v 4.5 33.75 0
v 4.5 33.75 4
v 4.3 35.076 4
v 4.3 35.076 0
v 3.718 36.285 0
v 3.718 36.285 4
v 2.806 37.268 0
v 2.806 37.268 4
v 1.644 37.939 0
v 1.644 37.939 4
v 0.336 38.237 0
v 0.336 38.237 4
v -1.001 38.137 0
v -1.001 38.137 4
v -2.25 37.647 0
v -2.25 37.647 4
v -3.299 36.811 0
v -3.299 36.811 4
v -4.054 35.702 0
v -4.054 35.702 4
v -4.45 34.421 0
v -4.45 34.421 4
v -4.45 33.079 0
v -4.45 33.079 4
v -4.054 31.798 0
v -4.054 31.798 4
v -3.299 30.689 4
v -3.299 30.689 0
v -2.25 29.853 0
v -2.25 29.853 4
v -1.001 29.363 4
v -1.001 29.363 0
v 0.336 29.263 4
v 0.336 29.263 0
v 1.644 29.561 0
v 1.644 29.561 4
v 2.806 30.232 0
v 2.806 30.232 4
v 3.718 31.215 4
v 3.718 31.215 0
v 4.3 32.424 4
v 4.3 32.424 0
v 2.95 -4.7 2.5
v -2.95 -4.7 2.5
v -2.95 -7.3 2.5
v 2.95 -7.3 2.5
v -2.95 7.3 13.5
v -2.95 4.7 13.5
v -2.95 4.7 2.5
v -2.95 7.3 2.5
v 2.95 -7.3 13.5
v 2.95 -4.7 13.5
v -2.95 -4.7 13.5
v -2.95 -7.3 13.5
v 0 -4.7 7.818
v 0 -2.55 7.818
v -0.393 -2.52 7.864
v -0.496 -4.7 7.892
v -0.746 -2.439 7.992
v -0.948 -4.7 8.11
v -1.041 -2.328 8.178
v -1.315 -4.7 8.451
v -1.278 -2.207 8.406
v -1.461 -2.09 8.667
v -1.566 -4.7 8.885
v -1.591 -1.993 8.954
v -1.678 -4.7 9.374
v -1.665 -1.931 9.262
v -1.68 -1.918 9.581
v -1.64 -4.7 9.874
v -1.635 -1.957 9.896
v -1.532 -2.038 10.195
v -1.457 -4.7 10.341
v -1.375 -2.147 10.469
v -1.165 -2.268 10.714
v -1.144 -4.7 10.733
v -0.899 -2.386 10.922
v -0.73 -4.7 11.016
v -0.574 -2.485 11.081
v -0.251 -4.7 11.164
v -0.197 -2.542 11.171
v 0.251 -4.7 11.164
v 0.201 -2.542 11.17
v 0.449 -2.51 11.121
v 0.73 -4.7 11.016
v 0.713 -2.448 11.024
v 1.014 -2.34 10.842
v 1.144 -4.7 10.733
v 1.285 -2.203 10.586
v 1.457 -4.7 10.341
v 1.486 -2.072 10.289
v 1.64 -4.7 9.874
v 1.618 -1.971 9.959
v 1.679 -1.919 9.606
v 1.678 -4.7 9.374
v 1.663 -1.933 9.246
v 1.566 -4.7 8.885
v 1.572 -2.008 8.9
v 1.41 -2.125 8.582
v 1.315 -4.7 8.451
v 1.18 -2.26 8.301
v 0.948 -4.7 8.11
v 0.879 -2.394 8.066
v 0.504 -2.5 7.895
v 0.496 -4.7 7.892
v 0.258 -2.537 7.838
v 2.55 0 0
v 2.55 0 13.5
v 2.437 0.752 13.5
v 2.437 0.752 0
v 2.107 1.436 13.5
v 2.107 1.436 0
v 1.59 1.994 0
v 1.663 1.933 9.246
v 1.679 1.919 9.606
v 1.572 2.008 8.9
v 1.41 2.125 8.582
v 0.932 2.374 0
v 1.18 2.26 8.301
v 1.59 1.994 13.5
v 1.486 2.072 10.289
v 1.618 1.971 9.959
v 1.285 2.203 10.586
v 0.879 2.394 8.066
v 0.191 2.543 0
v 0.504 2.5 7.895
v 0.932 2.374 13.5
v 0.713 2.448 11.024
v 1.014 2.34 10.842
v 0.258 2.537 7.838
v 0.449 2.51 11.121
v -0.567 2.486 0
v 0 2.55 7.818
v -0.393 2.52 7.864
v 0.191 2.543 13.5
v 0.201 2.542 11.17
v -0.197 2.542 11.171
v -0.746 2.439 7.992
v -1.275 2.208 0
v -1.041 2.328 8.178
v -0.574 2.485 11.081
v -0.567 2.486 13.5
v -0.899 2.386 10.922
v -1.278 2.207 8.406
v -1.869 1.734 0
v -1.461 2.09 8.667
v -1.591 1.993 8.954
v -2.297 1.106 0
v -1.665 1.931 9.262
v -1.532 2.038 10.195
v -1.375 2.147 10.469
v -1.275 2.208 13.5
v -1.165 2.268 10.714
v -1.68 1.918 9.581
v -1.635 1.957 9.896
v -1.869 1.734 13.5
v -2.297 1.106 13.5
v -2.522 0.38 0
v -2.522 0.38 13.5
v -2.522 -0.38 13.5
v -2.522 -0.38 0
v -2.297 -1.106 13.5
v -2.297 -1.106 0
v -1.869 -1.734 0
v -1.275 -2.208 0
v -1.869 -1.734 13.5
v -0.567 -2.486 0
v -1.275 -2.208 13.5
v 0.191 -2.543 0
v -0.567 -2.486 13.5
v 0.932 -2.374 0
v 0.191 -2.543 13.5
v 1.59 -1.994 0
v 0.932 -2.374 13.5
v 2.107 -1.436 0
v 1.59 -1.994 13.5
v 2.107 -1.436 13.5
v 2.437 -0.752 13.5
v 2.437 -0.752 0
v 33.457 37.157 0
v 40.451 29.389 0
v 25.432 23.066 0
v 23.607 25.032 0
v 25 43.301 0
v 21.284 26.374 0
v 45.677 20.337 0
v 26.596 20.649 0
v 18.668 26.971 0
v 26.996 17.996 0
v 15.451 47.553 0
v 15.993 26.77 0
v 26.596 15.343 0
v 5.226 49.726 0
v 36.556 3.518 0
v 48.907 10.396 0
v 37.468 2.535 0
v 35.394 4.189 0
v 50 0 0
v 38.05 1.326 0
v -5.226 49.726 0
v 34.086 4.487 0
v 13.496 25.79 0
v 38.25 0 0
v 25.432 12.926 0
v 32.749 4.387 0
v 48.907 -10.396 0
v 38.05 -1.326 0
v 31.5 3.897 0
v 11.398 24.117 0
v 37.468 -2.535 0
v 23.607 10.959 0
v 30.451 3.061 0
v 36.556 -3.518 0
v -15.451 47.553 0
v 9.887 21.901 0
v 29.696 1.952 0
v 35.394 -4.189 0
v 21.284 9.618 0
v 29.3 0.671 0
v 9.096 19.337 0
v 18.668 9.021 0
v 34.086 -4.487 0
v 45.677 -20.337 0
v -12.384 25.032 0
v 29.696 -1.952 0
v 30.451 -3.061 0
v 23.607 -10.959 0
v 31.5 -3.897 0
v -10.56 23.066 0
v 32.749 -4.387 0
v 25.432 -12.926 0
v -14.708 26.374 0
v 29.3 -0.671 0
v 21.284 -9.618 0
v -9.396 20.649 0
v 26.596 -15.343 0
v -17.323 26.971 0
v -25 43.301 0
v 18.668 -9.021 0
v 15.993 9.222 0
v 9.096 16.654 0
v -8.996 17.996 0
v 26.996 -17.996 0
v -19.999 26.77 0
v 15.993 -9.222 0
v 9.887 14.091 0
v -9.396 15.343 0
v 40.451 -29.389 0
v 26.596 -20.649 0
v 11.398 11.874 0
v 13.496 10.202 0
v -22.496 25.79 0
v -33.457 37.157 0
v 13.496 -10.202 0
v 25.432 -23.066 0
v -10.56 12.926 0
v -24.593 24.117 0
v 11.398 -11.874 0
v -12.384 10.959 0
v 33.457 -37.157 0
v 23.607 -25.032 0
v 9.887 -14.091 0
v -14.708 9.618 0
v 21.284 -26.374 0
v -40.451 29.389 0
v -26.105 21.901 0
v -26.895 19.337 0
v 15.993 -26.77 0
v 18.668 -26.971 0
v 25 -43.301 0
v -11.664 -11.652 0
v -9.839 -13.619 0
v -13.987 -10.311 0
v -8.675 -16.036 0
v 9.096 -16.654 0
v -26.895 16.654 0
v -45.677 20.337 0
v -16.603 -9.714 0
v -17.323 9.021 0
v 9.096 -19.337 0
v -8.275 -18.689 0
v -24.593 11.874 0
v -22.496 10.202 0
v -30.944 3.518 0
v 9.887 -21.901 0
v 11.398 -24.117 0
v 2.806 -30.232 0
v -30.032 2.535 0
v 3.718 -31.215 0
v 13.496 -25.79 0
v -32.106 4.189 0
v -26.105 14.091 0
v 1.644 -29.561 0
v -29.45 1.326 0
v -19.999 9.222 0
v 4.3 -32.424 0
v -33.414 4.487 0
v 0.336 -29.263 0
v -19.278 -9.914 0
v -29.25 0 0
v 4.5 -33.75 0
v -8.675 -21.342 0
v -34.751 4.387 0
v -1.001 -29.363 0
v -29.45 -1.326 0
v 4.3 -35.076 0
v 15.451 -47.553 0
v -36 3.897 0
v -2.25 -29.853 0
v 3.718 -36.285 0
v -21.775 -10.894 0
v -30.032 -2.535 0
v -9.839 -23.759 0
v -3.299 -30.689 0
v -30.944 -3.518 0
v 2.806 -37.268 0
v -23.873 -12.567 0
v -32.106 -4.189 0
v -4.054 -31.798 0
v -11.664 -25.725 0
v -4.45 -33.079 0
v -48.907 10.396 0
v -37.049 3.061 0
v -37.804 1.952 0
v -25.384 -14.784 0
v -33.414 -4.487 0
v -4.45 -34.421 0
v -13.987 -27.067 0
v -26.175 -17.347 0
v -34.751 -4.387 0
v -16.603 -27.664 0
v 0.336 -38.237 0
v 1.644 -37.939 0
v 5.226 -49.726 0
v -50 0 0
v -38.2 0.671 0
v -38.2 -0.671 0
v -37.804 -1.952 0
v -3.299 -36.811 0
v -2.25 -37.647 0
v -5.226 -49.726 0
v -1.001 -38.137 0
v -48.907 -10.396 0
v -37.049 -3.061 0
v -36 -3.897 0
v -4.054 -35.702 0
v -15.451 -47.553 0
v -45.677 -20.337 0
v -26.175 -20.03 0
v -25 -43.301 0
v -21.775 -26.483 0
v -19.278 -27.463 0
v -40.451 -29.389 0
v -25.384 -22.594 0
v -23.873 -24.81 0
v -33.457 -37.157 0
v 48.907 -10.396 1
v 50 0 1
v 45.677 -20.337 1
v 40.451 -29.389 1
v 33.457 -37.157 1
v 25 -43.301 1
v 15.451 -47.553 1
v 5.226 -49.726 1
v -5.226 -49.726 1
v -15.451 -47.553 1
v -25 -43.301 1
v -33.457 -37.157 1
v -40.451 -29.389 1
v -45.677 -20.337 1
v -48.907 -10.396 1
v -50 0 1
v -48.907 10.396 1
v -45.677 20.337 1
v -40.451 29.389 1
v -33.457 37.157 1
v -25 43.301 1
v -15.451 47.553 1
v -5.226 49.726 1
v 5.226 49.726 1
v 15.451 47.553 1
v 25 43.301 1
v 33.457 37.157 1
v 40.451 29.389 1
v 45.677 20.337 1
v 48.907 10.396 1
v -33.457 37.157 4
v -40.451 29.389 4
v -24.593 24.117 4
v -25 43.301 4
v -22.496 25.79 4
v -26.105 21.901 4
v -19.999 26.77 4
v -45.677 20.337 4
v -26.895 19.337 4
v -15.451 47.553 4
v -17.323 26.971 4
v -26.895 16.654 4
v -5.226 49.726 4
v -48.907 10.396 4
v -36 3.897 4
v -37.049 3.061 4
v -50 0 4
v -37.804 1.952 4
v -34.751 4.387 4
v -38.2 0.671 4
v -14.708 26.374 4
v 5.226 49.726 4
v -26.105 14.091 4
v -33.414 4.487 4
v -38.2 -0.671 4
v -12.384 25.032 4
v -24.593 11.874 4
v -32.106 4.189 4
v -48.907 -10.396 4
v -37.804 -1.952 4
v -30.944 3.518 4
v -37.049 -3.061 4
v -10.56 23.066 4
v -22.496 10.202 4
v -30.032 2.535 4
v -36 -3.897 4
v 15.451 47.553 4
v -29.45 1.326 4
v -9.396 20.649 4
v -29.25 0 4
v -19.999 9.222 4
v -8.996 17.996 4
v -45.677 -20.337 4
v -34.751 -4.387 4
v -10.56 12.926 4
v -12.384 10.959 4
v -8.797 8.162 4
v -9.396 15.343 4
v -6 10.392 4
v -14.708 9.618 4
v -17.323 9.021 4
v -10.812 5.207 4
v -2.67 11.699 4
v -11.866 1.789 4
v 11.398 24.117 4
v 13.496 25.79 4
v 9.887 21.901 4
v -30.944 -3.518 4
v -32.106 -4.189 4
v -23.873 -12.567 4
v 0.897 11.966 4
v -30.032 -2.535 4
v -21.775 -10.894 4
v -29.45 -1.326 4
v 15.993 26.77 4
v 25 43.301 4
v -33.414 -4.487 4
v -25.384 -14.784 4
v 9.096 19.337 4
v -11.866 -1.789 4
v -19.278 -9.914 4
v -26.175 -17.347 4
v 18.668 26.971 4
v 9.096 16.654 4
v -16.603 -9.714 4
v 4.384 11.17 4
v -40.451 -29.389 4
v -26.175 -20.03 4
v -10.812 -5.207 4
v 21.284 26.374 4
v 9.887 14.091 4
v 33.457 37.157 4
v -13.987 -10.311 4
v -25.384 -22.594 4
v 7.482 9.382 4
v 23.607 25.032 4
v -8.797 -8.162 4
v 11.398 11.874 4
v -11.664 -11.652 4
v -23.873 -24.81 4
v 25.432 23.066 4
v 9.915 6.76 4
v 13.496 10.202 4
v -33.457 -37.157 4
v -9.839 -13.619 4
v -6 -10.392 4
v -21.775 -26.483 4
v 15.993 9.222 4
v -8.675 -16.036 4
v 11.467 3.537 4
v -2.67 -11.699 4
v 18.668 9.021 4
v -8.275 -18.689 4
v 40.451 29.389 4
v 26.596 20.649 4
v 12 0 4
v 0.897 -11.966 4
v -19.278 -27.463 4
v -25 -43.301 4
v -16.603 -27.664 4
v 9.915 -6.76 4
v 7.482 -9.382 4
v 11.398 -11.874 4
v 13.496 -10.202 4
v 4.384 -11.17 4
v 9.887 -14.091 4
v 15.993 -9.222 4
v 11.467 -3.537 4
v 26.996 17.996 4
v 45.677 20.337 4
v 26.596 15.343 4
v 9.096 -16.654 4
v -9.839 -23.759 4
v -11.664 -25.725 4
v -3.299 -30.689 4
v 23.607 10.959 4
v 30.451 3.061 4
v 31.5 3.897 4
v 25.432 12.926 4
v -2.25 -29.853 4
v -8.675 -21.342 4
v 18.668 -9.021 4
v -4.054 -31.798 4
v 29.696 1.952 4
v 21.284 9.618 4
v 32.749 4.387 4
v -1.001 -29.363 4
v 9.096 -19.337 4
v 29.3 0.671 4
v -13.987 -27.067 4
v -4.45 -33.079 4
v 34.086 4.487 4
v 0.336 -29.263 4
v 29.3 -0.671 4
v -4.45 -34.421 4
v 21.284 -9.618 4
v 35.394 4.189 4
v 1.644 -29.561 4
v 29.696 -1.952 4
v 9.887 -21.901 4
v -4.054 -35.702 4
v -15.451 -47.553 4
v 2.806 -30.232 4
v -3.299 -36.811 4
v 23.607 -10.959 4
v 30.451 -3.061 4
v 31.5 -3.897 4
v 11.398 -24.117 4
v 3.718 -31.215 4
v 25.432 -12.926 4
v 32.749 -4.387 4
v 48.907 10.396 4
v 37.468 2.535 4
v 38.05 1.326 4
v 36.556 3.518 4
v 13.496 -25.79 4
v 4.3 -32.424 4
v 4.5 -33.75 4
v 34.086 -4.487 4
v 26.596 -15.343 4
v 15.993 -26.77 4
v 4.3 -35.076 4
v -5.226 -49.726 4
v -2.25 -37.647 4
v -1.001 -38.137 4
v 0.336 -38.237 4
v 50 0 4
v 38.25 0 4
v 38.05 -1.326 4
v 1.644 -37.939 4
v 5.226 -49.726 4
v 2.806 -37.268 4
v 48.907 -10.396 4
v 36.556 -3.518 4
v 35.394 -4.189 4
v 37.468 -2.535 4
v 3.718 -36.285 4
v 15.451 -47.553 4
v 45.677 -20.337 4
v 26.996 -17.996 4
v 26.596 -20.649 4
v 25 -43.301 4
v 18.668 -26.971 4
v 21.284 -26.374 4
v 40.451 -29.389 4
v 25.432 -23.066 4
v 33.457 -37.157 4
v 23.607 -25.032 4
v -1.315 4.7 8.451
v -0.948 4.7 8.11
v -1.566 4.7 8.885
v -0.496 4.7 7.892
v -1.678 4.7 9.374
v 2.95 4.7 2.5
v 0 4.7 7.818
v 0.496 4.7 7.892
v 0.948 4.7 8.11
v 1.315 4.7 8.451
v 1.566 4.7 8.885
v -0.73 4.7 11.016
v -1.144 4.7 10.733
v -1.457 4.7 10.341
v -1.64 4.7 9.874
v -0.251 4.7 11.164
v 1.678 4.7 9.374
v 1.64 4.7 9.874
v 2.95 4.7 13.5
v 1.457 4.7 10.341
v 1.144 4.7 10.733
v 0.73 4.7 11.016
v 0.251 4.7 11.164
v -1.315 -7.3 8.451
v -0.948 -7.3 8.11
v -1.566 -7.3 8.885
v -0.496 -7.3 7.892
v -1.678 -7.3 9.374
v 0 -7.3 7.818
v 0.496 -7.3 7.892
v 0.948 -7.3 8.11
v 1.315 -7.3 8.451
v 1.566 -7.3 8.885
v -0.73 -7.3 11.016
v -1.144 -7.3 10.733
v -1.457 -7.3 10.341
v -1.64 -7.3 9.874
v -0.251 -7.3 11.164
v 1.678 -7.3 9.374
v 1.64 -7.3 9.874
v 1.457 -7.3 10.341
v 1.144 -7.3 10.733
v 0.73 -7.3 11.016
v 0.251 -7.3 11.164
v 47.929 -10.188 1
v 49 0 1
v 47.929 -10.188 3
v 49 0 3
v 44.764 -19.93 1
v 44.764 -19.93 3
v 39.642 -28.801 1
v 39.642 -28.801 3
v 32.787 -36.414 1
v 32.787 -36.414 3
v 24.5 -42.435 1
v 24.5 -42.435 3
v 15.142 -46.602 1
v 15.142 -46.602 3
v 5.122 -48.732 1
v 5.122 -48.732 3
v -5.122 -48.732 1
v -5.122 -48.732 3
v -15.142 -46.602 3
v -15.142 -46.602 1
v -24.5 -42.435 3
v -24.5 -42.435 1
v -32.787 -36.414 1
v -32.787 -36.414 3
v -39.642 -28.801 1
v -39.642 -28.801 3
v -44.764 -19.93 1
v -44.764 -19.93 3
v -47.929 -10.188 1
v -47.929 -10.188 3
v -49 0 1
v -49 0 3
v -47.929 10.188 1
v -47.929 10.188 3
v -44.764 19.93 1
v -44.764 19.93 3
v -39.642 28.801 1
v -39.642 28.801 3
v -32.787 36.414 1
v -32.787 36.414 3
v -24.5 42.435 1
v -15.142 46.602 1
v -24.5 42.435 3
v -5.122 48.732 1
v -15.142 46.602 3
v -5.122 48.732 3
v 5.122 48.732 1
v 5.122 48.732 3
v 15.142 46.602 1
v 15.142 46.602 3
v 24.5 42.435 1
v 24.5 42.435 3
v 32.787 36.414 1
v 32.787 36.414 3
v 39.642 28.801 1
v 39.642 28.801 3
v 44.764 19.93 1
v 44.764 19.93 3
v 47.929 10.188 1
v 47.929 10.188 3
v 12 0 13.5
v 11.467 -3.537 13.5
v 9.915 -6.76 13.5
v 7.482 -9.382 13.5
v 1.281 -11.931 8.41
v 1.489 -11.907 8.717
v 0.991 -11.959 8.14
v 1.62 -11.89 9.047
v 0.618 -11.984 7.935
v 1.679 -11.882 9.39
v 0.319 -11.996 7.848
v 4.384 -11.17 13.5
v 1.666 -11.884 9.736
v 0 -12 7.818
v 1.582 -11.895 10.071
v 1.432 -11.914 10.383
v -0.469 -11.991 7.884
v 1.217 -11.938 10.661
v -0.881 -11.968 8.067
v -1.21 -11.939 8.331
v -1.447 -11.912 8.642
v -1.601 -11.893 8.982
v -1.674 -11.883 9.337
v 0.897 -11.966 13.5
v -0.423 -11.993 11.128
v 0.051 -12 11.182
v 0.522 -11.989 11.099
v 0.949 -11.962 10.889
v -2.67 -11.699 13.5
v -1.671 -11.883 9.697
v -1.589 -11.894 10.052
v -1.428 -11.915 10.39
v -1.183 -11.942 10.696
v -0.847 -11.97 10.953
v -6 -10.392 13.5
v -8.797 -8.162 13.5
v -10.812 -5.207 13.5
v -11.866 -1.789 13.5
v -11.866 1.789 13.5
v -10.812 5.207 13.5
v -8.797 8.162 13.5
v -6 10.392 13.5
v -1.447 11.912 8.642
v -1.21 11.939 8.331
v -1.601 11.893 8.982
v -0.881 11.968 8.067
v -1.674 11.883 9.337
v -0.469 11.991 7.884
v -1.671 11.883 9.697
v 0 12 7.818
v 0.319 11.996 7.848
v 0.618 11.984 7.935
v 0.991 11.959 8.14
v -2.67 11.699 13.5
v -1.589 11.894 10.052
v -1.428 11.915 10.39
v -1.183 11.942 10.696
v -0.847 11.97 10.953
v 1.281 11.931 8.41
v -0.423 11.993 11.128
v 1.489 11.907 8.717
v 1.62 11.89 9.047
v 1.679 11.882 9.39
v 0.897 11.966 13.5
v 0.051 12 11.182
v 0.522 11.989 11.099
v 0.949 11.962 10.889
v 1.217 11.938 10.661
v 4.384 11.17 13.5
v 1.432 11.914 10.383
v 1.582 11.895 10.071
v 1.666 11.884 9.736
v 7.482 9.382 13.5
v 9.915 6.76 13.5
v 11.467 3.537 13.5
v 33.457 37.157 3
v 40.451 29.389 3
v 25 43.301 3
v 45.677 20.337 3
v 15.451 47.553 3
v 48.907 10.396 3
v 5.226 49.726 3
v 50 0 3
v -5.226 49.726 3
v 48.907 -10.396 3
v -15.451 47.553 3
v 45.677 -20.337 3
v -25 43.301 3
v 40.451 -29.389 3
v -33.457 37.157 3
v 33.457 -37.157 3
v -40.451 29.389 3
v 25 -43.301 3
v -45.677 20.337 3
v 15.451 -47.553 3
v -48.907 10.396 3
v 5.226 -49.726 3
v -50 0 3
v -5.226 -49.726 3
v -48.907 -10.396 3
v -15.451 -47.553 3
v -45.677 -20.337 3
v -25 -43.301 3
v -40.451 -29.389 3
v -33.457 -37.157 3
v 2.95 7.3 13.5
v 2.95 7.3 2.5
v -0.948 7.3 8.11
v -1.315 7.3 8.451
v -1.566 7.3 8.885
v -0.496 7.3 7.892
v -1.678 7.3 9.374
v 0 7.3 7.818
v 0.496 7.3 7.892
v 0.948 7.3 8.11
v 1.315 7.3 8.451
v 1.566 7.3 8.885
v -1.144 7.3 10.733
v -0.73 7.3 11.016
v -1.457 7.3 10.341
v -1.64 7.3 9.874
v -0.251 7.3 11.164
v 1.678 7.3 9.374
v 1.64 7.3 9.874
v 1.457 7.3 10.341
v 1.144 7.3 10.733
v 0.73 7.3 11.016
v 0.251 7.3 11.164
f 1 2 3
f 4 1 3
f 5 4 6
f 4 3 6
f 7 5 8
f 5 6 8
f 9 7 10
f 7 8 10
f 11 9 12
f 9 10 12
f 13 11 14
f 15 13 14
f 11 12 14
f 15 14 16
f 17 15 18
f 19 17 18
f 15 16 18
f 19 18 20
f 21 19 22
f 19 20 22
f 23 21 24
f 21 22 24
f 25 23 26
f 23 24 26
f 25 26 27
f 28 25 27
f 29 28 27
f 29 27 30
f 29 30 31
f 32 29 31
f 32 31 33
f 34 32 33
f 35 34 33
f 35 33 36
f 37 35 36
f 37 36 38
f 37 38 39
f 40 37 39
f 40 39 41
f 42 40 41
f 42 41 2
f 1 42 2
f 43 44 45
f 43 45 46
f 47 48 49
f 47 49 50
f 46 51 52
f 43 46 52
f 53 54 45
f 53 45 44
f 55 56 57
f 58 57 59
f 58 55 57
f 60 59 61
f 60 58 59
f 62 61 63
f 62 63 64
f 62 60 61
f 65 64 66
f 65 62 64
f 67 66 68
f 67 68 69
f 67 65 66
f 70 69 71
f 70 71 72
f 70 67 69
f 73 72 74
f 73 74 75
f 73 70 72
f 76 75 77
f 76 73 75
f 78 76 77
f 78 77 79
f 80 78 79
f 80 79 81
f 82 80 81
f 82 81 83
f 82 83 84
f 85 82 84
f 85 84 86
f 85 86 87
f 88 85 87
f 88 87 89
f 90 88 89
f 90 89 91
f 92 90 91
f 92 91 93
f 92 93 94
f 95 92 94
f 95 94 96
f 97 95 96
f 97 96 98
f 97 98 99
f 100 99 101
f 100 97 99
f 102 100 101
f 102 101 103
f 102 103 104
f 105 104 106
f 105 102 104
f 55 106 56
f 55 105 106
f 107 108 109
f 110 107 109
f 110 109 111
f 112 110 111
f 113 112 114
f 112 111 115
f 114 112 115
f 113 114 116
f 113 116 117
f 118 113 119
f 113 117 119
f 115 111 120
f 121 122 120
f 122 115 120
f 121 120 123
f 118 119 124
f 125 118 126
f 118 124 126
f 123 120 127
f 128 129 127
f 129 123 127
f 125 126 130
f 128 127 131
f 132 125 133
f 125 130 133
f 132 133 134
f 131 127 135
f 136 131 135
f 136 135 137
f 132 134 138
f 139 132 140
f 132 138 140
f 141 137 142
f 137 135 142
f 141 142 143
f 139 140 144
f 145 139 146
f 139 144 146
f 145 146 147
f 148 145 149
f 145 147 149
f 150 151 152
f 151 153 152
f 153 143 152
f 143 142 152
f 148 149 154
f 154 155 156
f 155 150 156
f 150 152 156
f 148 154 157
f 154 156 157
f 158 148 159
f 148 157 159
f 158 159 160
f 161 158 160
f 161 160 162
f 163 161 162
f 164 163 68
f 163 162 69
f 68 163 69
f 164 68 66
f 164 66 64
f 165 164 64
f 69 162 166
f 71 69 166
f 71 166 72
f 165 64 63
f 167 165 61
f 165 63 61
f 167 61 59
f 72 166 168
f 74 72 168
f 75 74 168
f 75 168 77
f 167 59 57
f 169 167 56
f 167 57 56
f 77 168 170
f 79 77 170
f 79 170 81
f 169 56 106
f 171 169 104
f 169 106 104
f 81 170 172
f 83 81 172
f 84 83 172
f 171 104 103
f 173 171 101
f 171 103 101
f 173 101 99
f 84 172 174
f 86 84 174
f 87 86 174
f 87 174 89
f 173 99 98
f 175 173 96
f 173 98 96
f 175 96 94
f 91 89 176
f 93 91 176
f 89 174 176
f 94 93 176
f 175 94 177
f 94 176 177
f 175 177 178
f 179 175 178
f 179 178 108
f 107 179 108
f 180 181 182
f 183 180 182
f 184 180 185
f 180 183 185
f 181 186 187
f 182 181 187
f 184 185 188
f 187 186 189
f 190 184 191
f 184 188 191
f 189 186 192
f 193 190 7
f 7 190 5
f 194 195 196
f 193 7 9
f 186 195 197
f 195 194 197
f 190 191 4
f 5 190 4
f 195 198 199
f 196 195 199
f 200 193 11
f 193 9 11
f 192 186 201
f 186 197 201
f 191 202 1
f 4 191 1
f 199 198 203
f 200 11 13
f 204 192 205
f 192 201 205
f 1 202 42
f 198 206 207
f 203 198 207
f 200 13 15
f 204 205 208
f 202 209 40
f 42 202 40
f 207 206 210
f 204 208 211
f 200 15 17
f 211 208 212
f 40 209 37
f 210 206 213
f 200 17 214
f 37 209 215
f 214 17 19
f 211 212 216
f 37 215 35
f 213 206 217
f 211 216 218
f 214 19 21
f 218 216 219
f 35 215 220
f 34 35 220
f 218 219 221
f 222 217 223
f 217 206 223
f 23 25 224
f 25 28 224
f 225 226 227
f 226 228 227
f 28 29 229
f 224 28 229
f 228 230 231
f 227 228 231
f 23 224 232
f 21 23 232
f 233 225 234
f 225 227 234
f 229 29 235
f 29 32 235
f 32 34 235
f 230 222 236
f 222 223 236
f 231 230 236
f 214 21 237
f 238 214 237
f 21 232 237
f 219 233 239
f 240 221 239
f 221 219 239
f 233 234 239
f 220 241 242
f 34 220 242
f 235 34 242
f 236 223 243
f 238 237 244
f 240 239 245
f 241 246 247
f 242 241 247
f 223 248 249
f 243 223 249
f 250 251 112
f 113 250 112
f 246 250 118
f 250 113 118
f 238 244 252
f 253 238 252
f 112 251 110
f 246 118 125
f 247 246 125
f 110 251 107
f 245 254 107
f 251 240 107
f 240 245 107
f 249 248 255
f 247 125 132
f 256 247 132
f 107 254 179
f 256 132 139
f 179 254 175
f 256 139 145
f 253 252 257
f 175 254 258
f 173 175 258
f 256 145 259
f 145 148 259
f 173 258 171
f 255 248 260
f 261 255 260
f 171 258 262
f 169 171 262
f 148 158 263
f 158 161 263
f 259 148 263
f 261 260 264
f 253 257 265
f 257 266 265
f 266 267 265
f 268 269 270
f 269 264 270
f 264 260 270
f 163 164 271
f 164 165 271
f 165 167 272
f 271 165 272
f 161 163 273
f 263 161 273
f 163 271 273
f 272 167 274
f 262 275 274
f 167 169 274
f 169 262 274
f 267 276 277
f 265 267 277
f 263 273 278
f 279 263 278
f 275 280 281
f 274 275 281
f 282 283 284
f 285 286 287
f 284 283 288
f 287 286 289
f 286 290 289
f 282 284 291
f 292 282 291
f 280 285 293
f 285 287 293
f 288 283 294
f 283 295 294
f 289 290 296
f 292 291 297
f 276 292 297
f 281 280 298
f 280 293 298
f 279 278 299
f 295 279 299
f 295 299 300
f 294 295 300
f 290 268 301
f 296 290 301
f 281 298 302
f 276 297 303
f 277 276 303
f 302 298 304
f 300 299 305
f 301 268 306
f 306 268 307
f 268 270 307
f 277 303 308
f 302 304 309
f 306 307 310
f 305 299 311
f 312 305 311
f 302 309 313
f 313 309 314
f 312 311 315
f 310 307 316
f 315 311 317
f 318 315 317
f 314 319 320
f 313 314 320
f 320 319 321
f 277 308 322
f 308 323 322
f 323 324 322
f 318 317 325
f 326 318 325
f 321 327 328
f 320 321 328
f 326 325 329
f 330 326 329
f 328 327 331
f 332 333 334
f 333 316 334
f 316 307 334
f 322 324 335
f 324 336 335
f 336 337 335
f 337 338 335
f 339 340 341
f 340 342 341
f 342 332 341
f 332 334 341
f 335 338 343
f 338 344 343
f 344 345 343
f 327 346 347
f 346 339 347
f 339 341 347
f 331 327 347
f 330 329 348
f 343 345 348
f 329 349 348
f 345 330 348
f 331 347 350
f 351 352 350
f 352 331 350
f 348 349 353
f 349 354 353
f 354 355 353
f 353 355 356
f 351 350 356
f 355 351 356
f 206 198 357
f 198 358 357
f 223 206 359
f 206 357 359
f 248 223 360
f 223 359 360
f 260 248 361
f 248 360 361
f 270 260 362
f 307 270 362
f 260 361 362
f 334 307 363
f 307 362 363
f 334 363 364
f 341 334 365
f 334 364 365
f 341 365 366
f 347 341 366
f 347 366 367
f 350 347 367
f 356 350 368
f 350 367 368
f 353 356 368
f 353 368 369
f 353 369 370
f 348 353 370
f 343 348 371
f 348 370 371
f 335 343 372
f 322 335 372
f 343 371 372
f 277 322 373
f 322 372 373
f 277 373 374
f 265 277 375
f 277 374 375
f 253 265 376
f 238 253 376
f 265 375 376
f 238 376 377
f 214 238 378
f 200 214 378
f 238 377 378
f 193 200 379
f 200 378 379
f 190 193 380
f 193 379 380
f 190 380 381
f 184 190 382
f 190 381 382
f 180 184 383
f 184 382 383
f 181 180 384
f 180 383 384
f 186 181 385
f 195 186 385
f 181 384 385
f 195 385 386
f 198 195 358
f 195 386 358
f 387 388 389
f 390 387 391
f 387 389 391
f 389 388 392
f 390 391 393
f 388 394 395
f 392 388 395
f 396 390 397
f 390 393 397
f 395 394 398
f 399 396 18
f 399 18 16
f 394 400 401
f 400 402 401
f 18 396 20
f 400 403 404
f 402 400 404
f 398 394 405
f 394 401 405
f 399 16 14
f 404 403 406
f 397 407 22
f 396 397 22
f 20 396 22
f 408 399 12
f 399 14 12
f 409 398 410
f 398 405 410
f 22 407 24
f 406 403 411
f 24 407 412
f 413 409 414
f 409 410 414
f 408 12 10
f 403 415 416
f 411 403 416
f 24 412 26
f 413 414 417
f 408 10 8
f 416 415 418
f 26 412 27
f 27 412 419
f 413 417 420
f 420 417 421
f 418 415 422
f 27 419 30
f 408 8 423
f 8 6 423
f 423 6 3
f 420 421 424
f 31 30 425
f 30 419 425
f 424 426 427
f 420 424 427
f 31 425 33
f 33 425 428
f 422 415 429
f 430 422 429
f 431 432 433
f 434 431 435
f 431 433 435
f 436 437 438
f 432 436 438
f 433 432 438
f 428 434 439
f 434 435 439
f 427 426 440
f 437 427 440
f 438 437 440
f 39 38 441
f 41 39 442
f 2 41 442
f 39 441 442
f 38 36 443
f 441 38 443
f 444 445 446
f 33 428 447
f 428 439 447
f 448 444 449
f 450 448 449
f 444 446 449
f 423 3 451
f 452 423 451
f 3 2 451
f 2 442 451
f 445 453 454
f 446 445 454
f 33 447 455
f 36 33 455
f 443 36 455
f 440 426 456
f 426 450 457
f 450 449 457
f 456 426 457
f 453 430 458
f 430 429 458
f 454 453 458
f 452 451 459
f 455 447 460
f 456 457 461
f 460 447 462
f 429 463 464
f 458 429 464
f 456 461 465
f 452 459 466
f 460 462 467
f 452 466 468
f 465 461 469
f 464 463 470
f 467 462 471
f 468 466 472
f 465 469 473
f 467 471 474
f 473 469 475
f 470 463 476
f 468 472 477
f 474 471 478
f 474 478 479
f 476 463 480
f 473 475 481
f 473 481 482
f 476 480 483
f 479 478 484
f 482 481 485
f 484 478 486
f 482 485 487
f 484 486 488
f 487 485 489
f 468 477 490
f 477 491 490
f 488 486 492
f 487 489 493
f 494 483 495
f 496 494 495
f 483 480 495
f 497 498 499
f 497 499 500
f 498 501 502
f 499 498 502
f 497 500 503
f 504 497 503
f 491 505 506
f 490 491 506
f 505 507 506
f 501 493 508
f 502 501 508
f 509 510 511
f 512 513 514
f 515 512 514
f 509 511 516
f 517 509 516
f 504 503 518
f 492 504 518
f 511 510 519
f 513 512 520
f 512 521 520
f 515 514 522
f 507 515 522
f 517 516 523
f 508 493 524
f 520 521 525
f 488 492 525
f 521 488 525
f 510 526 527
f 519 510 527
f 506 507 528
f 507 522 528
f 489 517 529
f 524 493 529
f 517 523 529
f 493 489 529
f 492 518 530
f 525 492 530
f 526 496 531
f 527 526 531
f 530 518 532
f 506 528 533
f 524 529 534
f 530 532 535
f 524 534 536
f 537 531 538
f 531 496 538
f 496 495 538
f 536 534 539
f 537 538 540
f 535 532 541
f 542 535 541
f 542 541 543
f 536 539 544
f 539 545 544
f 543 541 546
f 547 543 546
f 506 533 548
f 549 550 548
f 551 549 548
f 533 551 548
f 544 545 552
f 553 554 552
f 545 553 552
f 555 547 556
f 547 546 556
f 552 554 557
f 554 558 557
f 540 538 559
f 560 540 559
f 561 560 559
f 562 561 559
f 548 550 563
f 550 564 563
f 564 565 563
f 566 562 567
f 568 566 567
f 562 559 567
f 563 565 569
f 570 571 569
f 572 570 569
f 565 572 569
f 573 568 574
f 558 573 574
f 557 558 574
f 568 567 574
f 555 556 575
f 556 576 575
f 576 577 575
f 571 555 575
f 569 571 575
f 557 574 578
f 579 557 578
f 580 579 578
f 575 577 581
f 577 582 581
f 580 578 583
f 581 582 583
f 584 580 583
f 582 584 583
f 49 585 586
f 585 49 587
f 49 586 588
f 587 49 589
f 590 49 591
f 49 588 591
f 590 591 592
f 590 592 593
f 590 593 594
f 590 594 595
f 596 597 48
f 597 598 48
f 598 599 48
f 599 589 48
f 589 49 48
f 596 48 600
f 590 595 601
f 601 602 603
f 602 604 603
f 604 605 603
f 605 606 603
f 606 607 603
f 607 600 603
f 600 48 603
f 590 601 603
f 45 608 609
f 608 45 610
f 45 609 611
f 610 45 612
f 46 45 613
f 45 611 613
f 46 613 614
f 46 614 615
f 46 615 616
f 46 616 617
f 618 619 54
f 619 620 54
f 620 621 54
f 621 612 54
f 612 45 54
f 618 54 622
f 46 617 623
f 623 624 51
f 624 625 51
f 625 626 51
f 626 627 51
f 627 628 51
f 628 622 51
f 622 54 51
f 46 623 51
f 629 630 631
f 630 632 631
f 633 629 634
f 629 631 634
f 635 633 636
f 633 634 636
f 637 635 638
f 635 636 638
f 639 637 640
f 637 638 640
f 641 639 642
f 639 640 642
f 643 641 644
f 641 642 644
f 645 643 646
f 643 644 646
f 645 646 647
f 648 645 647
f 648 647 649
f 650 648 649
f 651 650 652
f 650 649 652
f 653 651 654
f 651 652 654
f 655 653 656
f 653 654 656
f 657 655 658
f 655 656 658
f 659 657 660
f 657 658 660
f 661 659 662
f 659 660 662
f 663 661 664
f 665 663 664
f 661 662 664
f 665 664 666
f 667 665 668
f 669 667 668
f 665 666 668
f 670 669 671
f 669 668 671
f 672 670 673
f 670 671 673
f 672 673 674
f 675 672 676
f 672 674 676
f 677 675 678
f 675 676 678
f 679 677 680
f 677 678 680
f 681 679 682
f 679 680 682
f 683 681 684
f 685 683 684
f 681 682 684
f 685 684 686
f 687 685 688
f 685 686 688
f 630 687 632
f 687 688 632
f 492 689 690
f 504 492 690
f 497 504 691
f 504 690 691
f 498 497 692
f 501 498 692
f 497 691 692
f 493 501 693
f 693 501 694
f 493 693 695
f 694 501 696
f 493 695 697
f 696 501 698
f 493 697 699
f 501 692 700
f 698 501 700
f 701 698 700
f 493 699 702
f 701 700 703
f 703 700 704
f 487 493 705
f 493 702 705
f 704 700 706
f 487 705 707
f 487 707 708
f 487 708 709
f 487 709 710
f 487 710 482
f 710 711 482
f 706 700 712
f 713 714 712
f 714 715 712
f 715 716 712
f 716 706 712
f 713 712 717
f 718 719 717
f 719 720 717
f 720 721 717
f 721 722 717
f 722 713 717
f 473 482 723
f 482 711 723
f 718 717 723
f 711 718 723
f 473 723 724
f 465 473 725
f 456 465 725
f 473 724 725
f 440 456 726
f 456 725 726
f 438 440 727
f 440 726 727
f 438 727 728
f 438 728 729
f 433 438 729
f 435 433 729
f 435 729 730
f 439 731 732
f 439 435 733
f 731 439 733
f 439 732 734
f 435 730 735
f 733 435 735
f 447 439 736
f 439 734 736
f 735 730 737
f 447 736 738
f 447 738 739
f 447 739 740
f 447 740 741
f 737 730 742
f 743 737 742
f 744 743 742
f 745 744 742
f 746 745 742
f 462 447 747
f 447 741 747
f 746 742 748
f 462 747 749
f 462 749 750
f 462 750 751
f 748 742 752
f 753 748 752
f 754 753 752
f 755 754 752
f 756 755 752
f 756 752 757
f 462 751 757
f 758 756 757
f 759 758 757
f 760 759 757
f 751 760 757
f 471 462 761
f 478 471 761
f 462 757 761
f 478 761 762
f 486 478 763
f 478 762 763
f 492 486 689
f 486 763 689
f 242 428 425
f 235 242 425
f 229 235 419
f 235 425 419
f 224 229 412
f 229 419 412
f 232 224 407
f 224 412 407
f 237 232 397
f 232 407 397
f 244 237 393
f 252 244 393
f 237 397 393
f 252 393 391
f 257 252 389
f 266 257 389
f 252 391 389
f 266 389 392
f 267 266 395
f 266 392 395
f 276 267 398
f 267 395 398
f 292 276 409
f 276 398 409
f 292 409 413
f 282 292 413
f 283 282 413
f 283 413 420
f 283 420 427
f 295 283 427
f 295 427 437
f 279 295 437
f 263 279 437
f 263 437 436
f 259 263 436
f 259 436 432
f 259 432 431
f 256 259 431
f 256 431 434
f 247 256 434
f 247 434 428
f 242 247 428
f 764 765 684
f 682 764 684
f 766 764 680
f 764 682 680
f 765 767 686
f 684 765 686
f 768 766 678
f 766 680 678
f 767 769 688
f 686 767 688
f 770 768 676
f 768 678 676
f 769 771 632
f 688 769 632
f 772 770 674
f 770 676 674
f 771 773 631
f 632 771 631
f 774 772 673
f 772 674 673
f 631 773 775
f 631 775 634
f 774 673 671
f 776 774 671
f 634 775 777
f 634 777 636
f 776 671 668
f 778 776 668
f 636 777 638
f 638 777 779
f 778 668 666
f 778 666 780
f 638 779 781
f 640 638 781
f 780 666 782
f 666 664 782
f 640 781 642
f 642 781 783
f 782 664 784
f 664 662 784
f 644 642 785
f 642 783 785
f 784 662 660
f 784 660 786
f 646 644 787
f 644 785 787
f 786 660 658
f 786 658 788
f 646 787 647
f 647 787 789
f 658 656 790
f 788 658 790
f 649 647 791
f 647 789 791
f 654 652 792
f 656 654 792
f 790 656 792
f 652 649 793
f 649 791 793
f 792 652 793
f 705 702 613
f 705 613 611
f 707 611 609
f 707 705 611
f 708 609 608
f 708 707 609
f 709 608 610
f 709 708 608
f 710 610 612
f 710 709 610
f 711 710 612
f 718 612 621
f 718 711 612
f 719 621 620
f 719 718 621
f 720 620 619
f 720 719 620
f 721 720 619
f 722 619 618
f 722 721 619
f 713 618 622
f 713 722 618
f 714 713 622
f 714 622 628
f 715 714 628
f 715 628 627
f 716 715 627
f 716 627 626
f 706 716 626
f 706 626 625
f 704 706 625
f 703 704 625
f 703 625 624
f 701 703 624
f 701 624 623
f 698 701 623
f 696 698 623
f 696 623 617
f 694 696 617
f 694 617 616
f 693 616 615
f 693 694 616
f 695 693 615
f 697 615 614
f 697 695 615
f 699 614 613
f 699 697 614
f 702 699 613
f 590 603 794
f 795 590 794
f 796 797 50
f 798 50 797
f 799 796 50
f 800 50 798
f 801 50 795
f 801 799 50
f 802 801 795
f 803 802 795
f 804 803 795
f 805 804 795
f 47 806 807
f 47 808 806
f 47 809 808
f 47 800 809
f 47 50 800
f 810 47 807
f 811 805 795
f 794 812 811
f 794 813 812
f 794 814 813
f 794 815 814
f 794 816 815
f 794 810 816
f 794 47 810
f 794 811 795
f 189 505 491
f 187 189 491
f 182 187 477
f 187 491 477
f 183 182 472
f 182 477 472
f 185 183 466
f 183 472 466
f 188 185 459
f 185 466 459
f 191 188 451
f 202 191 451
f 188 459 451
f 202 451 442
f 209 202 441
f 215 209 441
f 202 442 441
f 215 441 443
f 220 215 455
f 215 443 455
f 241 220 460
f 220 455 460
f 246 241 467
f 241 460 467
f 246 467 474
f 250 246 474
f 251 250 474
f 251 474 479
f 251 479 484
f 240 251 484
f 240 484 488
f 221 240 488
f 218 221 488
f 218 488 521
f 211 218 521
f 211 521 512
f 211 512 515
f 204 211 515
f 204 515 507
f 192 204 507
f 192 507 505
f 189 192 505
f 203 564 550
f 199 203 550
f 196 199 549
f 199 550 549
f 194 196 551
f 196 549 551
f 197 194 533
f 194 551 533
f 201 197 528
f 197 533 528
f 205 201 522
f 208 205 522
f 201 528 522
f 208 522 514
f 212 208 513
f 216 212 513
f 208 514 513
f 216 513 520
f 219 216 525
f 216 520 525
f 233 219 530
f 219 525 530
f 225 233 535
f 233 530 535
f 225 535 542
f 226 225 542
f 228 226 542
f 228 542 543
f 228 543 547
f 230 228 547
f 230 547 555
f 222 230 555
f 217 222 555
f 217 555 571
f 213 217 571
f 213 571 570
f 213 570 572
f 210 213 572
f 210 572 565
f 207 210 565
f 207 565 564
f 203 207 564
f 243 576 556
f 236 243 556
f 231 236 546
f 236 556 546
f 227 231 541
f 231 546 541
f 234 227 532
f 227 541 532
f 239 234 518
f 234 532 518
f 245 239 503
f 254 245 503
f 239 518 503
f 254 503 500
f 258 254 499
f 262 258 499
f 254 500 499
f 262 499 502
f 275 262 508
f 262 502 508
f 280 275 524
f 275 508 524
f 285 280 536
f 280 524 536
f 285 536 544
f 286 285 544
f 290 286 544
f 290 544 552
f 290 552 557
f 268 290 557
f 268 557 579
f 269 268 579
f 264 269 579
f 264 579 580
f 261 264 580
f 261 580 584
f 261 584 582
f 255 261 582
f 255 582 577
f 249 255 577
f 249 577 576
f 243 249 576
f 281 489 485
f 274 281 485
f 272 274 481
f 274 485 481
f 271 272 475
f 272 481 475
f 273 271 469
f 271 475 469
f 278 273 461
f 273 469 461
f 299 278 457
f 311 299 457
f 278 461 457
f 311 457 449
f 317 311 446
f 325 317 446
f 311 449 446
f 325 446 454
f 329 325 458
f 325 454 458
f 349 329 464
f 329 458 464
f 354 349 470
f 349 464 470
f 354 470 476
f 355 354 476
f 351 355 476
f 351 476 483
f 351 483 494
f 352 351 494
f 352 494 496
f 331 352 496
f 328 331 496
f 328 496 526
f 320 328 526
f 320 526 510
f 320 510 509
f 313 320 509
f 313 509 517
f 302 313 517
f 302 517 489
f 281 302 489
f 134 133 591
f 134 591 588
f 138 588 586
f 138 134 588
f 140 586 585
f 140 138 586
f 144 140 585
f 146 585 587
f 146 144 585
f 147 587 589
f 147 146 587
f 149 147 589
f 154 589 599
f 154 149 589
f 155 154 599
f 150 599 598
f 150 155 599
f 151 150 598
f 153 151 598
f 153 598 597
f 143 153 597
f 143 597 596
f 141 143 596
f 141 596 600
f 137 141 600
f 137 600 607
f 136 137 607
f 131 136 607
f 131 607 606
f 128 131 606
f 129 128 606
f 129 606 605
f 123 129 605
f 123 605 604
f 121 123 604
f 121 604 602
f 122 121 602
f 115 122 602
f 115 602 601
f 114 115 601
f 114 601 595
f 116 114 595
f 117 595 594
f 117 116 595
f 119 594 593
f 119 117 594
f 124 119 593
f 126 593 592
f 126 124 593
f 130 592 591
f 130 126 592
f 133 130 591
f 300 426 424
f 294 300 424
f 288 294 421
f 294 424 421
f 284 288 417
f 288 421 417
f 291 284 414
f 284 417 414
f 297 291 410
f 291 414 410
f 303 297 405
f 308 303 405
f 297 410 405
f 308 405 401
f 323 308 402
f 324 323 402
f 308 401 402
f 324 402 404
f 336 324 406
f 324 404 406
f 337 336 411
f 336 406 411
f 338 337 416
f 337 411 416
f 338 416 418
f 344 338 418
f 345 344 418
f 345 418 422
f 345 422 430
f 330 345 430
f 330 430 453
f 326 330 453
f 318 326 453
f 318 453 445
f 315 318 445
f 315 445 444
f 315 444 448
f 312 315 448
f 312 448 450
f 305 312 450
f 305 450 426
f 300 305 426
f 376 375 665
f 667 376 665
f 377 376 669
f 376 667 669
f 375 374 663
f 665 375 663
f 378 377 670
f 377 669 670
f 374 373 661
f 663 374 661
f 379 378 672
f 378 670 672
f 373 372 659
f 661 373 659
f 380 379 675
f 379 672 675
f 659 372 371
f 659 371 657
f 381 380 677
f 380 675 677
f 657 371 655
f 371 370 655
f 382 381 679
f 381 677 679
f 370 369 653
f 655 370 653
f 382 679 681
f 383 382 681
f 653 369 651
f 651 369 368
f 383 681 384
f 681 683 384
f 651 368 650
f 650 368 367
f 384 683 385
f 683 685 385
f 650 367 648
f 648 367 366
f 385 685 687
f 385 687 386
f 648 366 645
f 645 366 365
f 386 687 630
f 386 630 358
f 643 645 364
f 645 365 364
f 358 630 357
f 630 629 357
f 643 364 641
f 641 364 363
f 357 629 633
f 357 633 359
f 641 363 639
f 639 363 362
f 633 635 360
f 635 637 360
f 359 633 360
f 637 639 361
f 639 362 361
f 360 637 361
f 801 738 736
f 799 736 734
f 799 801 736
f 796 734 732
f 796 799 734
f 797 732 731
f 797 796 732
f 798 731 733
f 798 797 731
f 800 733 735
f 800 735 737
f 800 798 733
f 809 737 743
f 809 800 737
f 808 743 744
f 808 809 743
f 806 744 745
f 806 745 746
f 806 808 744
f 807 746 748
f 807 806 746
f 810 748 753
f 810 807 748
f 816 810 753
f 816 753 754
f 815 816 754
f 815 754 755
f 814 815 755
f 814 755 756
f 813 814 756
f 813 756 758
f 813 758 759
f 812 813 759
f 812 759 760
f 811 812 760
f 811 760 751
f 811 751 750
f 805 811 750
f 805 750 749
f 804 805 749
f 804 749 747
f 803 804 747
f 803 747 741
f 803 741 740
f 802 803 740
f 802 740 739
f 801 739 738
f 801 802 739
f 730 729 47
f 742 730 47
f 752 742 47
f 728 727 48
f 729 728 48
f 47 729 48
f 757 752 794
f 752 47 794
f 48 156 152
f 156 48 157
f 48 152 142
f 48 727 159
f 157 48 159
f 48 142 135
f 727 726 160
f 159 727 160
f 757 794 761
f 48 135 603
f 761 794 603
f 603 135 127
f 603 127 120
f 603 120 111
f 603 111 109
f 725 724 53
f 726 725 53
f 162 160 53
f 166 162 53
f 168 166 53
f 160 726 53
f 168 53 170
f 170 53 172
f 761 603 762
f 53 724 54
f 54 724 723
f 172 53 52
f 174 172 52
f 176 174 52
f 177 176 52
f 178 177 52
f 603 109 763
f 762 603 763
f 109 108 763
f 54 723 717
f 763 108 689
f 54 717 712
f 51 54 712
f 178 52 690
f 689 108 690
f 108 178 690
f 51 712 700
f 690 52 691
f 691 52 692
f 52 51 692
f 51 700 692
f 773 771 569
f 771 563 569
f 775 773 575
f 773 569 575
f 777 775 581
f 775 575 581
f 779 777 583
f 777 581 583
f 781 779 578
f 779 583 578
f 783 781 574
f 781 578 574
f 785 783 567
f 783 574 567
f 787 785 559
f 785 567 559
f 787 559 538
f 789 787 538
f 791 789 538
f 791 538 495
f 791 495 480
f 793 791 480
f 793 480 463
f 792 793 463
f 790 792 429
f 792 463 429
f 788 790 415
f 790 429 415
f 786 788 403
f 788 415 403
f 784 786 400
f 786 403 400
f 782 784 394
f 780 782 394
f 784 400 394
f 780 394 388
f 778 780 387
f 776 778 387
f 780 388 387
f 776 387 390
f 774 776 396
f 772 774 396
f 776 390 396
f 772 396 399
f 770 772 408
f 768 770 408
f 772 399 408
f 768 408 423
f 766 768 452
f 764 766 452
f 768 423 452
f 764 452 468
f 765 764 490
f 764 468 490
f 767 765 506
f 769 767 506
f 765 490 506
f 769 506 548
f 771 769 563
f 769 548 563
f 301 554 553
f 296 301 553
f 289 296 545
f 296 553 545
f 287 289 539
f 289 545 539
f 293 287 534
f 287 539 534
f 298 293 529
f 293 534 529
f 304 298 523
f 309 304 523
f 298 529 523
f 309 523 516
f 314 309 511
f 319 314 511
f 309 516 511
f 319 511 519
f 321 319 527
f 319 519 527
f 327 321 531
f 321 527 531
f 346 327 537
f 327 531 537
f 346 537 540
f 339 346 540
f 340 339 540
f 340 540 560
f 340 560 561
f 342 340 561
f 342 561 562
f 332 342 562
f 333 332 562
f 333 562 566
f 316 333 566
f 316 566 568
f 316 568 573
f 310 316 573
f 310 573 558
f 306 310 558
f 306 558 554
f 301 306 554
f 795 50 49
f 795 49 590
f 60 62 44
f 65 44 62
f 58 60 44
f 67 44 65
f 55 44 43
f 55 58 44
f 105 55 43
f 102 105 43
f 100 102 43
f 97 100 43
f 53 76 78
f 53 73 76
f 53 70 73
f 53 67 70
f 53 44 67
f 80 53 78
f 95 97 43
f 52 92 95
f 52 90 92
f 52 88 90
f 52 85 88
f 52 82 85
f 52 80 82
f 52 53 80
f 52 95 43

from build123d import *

# Parameters (mm, degrees)
SKETCH2_R               = 2.55
CUT_EXTRUDE1_DEPTH      = 36
SKETCH3_W               = 5.9
SKETCH3_H               = 2.6
CUT_EXTRUDE2_DEPTH      = 11
SKETCH4_R               = 4.5
SKETCH4_R_2             = 9
CUT_EXTRUDE3_DEPTH      = 11
CUT_EXTRUDE4_DEPTH      = 61
CUT_EXTRUDE4_DEPTH_BACK = 81
SKETCH5_R               = 1.682339559


with BuildPart() as part:
    # Sketch1 → Revolve2 (revolve)
    with BuildSketch(Plane(origin=(0, 0, 0), x_dir=(0, 0, -1), z_dir=(1, 0, 0)), mode=Mode.PRIVATE) as revolve2_sk:
        Polygon((0, 0), (0, 50), (-1, 50), (-1, 49), (-3, 49), (-3, 50), (-4, 50), (-4, 12), (-13.5, 12), (-13.5, 0), align=None)
    revolve(revolve2_sk.sketch.rotate(Axis((0, 0, 13.5), (0, 0, -1)), 90), axis=Axis((0, 0, 13.5), (0, 0, -1)))

    # Sketch2 → Cut-Extrude1 (cut)
    with BuildSketch(Plane.XY.offset(13.5)):
        Circle(SKETCH2_R)
    extrude(amount=-CUT_EXTRUDE1_DEPTH, mode=Mode.SUBTRACT)

    # Sketch3 → Cut-Extrude2 (cut)
    with BuildSketch(Plane.XY.offset(13.5)):
        with Locations((0, 6)):
            Rectangle(SKETCH3_W, SKETCH3_H)
        with Locations((0, -6)):
            Rectangle(SKETCH3_W, SKETCH3_H)
    extrude(amount=-CUT_EXTRUDE2_DEPTH, mode=Mode.SUBTRACT)

    # Sketch4 → Cut-Extrude3 (cut)
    with BuildSketch(Plane.XY.offset(4)):
        with Locations((0, 33.75)):
            Circle(SKETCH4_R)
        with Locations((0, -33.75)):
            Circle(SKETCH4_R)
        with Locations((33.75, 0)):
            Circle(SKETCH4_R)
        with Locations((-33.75, 0)):
            Circle(SKETCH4_R)
        with Locations((-17.995867581, 17.995867581)):
            Circle(SKETCH4_R_2)
        with Locations((17.995867581, 17.995867581)):
            Circle(SKETCH4_R_2)
        with Locations((17.995867581, -17.995867581)):
            Circle(SKETCH4_R_2)
        with Locations((-17.27525282, -18.688716917)):
            Circle(SKETCH4_R_2)
    extrude(amount=-CUT_EXTRUDE3_DEPTH, mode=Mode.SUBTRACT)

    # Sketch5 → Cut-Extrude4 (cut, two sides: drawn at the far end of the back side and taken through both)
    with BuildSketch(Plane(origin=(0, 4.7, 0), x_dir=(1, 0, 0), z_dir=(0, 1, 0)).offset(-CUT_EXTRUDE4_DEPTH_BACK)):
        with Locations(Location((0, -9.5, 0), (0, 0, 90))):
            Circle(SKETCH5_R)
    extrude(amount=CUT_EXTRUDE4_DEPTH + CUT_EXTRUDE4_DEPTH_BACK, mode=Mode.SUBTRACT)


solid = part.part
